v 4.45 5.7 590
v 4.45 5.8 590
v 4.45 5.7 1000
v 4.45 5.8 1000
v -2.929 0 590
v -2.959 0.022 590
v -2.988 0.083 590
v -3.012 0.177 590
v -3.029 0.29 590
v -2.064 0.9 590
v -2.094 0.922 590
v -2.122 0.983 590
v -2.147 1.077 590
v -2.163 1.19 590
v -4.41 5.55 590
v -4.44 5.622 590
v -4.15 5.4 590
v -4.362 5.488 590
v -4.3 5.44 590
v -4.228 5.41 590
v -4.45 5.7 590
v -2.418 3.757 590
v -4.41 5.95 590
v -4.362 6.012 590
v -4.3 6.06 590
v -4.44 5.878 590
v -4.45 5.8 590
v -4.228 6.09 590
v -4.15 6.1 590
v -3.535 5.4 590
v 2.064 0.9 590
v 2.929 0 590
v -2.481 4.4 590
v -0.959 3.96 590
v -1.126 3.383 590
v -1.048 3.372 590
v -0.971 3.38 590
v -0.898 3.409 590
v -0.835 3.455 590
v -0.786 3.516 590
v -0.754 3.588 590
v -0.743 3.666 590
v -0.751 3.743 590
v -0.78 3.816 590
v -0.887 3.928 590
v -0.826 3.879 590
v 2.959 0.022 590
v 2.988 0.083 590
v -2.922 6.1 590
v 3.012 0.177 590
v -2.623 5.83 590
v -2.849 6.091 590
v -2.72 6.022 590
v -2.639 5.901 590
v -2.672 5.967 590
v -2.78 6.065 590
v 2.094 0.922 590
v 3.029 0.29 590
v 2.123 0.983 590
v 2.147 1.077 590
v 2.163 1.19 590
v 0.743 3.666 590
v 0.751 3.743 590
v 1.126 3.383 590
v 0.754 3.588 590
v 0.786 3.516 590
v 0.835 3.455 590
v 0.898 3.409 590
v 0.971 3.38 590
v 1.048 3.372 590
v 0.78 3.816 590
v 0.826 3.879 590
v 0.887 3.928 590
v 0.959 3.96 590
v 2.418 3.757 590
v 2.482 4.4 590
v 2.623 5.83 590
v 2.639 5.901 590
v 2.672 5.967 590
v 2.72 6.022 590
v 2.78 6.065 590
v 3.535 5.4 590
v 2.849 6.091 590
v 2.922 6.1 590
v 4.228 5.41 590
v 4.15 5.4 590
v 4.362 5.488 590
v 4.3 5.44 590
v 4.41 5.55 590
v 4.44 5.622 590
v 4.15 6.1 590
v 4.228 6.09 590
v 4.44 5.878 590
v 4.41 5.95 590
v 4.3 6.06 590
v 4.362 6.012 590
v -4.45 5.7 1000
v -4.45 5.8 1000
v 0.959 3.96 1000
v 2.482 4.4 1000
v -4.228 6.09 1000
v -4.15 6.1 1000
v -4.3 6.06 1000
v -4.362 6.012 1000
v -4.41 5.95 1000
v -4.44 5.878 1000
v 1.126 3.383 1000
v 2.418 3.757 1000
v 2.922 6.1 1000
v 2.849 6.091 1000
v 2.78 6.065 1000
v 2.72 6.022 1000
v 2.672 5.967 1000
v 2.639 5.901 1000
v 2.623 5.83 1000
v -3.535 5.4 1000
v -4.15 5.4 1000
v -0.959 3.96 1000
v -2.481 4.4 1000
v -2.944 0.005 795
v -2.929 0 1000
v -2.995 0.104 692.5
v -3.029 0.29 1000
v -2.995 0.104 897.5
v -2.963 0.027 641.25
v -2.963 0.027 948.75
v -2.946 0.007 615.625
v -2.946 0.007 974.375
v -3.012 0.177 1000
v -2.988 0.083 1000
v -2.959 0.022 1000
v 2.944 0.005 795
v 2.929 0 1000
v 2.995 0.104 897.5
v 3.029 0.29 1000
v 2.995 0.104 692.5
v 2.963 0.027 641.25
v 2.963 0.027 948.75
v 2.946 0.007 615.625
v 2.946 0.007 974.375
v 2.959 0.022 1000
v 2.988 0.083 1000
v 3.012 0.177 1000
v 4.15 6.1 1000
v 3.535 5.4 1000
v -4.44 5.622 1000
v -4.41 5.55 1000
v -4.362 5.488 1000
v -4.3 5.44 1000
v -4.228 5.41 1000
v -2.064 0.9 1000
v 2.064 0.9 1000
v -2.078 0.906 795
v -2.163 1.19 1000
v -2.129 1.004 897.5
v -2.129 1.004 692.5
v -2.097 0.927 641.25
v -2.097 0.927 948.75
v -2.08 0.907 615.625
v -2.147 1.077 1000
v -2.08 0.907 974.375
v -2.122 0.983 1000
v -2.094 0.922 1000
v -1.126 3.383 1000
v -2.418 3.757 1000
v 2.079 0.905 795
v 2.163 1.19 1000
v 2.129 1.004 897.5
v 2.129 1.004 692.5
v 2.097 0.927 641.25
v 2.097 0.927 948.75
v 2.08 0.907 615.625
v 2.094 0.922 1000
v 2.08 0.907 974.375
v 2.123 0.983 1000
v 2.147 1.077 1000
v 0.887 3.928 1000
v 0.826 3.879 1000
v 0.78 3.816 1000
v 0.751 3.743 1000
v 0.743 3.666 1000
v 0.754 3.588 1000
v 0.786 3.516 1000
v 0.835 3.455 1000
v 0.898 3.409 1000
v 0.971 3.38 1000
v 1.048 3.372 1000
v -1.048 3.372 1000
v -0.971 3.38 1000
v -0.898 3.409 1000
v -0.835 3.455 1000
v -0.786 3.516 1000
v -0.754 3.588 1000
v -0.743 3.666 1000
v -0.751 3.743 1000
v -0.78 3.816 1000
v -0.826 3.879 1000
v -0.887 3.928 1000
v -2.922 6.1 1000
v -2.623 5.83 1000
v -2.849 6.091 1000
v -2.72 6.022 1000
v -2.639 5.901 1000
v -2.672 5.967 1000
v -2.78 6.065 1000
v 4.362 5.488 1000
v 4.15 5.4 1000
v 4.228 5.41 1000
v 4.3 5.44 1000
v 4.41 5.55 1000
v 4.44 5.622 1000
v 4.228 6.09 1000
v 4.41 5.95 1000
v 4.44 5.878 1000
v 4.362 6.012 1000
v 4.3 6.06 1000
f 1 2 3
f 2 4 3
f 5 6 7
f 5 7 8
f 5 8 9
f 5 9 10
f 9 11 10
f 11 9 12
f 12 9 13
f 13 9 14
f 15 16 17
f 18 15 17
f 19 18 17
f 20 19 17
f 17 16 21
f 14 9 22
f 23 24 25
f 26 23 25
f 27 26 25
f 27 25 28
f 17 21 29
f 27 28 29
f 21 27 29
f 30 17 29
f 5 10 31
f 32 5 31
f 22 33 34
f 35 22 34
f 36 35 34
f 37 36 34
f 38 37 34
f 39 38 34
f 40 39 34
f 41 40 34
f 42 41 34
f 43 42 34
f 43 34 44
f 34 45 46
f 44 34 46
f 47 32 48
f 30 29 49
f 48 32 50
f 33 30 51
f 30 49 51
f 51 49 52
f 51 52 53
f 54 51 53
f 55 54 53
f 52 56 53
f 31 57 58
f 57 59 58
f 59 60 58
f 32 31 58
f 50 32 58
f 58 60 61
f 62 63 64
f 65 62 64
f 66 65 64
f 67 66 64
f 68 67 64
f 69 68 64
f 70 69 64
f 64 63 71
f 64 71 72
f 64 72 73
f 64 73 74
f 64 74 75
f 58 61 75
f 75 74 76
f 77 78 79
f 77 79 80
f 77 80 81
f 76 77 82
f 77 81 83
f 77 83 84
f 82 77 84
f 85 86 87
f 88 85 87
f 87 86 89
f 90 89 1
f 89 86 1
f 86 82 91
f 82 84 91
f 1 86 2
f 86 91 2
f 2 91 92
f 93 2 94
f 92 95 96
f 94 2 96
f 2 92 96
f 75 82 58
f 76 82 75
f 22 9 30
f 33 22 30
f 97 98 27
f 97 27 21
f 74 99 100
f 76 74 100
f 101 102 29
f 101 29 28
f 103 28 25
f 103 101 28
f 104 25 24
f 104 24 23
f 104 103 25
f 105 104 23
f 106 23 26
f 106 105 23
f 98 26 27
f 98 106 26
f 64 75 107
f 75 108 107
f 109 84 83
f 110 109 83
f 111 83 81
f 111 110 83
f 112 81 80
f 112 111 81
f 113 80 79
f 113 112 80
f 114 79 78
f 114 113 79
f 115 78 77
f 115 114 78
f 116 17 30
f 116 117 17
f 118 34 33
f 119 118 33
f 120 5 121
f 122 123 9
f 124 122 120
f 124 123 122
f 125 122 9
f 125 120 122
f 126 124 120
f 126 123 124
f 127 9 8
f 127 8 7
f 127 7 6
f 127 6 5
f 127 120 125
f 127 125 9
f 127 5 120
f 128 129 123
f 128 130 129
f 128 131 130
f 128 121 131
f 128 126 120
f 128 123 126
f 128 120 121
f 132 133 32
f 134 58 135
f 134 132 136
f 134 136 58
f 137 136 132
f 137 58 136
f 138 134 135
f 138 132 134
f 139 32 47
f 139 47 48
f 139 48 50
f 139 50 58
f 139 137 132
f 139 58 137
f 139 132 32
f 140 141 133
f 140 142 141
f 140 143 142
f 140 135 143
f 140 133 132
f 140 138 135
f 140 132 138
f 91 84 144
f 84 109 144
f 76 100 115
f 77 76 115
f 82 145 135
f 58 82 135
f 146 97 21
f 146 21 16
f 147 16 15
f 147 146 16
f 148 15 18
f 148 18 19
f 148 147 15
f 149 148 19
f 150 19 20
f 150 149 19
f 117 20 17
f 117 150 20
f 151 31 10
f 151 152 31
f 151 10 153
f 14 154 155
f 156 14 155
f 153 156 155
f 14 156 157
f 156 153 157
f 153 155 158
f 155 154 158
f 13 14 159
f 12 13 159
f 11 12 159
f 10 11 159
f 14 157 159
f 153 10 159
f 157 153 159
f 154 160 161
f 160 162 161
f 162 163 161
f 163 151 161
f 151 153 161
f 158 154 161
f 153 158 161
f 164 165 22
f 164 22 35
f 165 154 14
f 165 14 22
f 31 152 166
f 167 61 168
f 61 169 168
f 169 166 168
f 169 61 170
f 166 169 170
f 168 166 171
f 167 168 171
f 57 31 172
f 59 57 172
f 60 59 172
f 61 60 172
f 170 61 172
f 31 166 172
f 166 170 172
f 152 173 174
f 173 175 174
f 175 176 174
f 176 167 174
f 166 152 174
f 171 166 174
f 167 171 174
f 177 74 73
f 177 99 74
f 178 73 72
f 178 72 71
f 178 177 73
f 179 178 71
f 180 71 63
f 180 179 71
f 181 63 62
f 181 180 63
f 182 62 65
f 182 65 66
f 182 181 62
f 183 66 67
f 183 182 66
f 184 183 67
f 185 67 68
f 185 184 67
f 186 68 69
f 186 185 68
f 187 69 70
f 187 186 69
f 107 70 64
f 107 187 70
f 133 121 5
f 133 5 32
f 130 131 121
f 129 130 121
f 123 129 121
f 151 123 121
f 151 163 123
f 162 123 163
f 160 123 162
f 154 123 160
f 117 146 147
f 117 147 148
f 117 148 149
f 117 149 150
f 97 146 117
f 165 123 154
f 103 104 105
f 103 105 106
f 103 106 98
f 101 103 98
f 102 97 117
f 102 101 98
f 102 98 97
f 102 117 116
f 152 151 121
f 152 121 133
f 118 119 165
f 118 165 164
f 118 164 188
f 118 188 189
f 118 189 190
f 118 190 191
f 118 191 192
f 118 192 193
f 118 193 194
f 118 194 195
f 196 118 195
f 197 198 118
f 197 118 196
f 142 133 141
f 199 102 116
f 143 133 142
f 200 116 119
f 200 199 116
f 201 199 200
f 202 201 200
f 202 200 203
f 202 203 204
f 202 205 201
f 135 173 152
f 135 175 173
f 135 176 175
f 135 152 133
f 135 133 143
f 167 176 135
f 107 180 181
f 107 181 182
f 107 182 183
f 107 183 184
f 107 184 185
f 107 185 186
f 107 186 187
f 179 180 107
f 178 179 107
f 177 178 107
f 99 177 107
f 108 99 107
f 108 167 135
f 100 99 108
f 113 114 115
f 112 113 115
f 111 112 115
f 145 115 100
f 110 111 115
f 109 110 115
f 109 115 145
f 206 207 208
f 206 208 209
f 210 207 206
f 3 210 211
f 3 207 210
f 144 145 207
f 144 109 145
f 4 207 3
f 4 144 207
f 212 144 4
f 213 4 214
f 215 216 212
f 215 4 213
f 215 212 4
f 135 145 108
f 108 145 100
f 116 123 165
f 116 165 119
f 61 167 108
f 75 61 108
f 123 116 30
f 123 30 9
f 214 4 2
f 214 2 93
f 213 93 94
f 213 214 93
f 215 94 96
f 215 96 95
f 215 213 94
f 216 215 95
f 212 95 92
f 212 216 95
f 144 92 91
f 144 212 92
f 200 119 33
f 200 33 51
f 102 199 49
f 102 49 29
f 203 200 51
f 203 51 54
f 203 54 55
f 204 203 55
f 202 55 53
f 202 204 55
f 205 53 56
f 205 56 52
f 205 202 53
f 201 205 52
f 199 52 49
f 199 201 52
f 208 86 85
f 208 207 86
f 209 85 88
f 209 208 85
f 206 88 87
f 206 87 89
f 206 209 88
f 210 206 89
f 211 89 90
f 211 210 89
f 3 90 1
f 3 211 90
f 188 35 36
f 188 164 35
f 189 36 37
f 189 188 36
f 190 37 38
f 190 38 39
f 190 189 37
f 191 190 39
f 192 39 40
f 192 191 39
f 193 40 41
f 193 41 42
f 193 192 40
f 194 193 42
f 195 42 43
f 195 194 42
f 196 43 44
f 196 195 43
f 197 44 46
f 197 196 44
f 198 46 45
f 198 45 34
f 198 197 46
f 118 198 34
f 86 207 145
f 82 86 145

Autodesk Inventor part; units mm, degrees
ref_plane "YZ Plane" through (0, 0, 0) normal (1, 0, 0) x (0, 1, 0)
ref_plane "XZ Plane" through (0, 0, 0) normal (0, 1, 0) x (-1, 0, 0)
ref_plane "РабПлоскость5" through (-2.9292, 0, 1000) normal (0, 0, 1) x (1, 0, 0)
sketch "Эскиз1" plane through (-2.9292, 0, 1000) normal (0, 0, 1) x (1, 0, 0)
  ellipse E0 centre (5.8827, 0.3219) end of major axis (5.857, 0.0001) minor radius 0.0779 (5.8585, 0) -> (5.958, 0.2901) ccw
  arc A0 (1.8034, 3.3833) -> (1.97, 3.9597) centre (1.8867, 3.6715) ccw
  arc A1 (3.8884, 3.9597) -> (4.0551, 3.3833) centre (3.9718, 3.6715) ccw
  line L0 (5.347, 3.757) -> (4.0551, 3.3833)
  line L1 (5.0926, 1.1901) -> (5.347, 3.757)
  ellipse E1 centre (0.8413, 1.2219) end of major axis (0.8156, 1.5437) minor radius 0.0779 (0.7659, 1.1901) -> (0.8654, 0.9) ccw
  line L2 (4.993, 0.9) -> (0.8654, 0.9)
  ellipse E2 centre (5.0172, 1.2219) end of major axis (5.0429, 1.5437) minor radius 0.0779 (4.993, 0.9) -> (5.0926, 1.1901) ccw
  line L3 (0.7659, 1.1901) -> (0.5115, 3.757)
  line L4 (1.97, 3.9597) -> (0.4478, 4.4)
  line L5 (3.8884, 3.9597) -> (5.4107, 4.4)
  line L6 (5.4107, 4.4) -> (5.5524, 5.8296)
  arc A2 (5.851, 6.1) -> (5.5524, 5.8296) centre (5.851, 5.8) ccw
  line L7 (5.851, 6.1) -> (7.0792, 6.1)
  arc A3 (7.3792, 5.8) -> (7.0792, 6.1) centre (7.0792, 5.8) ccw
  arc A4 (7.0792, 5.4) -> (7.3792, 5.7) centre (7.0792, 5.7) ccw
  line L8 (7.0792, 5.4) -> (6.4645, 5.4)
  line L9 (-0.606, 5.4) -> (-0.0995, 0.2901)
  line L10 (-1.2208, 5.4) -> (-0.606, 5.4)
  arc A5 (-1.5208, 5.7) -> (-1.2208, 5.4) centre (-1.2208, 5.7) ccw
  line L11 (-1.5208, 5.8) -> (-1.5208, 5.7)
  arc A6 (-1.2208, 6.1) -> (-1.5208, 5.8) centre (-1.2208, 5.8) ccw
  line L12 (0.0075, 6.1) -> (-1.2208, 6.1)
  arc A7 (0.3061, 5.8296) -> (0.0075, 6.1) centre (0.0075, 5.8) ccw
  line L13 (0.4478, 4.4) -> (0.3061, 5.8296)
  ellipse E3 centre (-0.0242, 0.3219) end of major axis (0.0015, 0.0001) minor radius 0.0779 (-0.0995, 0.2901) -> (0, 0) ccw
  line L14 (0, 0) -> (5.8585, 0)
  line L15 (6.4645, 5.4) -> (5.958, 0.2901)
  line L16 (7.3792, 5.8) -> (7.3792, 5.7)
  line L17 (0.5115, 3.757) -> (1.8034, 3.3833)
  point P0 (2.9292, 0)
extrude "Выдавливание1" add sketch "Эскиз1" against normal blind 410
properties part number "Uplotnitel-pazovyy410_-paz-6"
